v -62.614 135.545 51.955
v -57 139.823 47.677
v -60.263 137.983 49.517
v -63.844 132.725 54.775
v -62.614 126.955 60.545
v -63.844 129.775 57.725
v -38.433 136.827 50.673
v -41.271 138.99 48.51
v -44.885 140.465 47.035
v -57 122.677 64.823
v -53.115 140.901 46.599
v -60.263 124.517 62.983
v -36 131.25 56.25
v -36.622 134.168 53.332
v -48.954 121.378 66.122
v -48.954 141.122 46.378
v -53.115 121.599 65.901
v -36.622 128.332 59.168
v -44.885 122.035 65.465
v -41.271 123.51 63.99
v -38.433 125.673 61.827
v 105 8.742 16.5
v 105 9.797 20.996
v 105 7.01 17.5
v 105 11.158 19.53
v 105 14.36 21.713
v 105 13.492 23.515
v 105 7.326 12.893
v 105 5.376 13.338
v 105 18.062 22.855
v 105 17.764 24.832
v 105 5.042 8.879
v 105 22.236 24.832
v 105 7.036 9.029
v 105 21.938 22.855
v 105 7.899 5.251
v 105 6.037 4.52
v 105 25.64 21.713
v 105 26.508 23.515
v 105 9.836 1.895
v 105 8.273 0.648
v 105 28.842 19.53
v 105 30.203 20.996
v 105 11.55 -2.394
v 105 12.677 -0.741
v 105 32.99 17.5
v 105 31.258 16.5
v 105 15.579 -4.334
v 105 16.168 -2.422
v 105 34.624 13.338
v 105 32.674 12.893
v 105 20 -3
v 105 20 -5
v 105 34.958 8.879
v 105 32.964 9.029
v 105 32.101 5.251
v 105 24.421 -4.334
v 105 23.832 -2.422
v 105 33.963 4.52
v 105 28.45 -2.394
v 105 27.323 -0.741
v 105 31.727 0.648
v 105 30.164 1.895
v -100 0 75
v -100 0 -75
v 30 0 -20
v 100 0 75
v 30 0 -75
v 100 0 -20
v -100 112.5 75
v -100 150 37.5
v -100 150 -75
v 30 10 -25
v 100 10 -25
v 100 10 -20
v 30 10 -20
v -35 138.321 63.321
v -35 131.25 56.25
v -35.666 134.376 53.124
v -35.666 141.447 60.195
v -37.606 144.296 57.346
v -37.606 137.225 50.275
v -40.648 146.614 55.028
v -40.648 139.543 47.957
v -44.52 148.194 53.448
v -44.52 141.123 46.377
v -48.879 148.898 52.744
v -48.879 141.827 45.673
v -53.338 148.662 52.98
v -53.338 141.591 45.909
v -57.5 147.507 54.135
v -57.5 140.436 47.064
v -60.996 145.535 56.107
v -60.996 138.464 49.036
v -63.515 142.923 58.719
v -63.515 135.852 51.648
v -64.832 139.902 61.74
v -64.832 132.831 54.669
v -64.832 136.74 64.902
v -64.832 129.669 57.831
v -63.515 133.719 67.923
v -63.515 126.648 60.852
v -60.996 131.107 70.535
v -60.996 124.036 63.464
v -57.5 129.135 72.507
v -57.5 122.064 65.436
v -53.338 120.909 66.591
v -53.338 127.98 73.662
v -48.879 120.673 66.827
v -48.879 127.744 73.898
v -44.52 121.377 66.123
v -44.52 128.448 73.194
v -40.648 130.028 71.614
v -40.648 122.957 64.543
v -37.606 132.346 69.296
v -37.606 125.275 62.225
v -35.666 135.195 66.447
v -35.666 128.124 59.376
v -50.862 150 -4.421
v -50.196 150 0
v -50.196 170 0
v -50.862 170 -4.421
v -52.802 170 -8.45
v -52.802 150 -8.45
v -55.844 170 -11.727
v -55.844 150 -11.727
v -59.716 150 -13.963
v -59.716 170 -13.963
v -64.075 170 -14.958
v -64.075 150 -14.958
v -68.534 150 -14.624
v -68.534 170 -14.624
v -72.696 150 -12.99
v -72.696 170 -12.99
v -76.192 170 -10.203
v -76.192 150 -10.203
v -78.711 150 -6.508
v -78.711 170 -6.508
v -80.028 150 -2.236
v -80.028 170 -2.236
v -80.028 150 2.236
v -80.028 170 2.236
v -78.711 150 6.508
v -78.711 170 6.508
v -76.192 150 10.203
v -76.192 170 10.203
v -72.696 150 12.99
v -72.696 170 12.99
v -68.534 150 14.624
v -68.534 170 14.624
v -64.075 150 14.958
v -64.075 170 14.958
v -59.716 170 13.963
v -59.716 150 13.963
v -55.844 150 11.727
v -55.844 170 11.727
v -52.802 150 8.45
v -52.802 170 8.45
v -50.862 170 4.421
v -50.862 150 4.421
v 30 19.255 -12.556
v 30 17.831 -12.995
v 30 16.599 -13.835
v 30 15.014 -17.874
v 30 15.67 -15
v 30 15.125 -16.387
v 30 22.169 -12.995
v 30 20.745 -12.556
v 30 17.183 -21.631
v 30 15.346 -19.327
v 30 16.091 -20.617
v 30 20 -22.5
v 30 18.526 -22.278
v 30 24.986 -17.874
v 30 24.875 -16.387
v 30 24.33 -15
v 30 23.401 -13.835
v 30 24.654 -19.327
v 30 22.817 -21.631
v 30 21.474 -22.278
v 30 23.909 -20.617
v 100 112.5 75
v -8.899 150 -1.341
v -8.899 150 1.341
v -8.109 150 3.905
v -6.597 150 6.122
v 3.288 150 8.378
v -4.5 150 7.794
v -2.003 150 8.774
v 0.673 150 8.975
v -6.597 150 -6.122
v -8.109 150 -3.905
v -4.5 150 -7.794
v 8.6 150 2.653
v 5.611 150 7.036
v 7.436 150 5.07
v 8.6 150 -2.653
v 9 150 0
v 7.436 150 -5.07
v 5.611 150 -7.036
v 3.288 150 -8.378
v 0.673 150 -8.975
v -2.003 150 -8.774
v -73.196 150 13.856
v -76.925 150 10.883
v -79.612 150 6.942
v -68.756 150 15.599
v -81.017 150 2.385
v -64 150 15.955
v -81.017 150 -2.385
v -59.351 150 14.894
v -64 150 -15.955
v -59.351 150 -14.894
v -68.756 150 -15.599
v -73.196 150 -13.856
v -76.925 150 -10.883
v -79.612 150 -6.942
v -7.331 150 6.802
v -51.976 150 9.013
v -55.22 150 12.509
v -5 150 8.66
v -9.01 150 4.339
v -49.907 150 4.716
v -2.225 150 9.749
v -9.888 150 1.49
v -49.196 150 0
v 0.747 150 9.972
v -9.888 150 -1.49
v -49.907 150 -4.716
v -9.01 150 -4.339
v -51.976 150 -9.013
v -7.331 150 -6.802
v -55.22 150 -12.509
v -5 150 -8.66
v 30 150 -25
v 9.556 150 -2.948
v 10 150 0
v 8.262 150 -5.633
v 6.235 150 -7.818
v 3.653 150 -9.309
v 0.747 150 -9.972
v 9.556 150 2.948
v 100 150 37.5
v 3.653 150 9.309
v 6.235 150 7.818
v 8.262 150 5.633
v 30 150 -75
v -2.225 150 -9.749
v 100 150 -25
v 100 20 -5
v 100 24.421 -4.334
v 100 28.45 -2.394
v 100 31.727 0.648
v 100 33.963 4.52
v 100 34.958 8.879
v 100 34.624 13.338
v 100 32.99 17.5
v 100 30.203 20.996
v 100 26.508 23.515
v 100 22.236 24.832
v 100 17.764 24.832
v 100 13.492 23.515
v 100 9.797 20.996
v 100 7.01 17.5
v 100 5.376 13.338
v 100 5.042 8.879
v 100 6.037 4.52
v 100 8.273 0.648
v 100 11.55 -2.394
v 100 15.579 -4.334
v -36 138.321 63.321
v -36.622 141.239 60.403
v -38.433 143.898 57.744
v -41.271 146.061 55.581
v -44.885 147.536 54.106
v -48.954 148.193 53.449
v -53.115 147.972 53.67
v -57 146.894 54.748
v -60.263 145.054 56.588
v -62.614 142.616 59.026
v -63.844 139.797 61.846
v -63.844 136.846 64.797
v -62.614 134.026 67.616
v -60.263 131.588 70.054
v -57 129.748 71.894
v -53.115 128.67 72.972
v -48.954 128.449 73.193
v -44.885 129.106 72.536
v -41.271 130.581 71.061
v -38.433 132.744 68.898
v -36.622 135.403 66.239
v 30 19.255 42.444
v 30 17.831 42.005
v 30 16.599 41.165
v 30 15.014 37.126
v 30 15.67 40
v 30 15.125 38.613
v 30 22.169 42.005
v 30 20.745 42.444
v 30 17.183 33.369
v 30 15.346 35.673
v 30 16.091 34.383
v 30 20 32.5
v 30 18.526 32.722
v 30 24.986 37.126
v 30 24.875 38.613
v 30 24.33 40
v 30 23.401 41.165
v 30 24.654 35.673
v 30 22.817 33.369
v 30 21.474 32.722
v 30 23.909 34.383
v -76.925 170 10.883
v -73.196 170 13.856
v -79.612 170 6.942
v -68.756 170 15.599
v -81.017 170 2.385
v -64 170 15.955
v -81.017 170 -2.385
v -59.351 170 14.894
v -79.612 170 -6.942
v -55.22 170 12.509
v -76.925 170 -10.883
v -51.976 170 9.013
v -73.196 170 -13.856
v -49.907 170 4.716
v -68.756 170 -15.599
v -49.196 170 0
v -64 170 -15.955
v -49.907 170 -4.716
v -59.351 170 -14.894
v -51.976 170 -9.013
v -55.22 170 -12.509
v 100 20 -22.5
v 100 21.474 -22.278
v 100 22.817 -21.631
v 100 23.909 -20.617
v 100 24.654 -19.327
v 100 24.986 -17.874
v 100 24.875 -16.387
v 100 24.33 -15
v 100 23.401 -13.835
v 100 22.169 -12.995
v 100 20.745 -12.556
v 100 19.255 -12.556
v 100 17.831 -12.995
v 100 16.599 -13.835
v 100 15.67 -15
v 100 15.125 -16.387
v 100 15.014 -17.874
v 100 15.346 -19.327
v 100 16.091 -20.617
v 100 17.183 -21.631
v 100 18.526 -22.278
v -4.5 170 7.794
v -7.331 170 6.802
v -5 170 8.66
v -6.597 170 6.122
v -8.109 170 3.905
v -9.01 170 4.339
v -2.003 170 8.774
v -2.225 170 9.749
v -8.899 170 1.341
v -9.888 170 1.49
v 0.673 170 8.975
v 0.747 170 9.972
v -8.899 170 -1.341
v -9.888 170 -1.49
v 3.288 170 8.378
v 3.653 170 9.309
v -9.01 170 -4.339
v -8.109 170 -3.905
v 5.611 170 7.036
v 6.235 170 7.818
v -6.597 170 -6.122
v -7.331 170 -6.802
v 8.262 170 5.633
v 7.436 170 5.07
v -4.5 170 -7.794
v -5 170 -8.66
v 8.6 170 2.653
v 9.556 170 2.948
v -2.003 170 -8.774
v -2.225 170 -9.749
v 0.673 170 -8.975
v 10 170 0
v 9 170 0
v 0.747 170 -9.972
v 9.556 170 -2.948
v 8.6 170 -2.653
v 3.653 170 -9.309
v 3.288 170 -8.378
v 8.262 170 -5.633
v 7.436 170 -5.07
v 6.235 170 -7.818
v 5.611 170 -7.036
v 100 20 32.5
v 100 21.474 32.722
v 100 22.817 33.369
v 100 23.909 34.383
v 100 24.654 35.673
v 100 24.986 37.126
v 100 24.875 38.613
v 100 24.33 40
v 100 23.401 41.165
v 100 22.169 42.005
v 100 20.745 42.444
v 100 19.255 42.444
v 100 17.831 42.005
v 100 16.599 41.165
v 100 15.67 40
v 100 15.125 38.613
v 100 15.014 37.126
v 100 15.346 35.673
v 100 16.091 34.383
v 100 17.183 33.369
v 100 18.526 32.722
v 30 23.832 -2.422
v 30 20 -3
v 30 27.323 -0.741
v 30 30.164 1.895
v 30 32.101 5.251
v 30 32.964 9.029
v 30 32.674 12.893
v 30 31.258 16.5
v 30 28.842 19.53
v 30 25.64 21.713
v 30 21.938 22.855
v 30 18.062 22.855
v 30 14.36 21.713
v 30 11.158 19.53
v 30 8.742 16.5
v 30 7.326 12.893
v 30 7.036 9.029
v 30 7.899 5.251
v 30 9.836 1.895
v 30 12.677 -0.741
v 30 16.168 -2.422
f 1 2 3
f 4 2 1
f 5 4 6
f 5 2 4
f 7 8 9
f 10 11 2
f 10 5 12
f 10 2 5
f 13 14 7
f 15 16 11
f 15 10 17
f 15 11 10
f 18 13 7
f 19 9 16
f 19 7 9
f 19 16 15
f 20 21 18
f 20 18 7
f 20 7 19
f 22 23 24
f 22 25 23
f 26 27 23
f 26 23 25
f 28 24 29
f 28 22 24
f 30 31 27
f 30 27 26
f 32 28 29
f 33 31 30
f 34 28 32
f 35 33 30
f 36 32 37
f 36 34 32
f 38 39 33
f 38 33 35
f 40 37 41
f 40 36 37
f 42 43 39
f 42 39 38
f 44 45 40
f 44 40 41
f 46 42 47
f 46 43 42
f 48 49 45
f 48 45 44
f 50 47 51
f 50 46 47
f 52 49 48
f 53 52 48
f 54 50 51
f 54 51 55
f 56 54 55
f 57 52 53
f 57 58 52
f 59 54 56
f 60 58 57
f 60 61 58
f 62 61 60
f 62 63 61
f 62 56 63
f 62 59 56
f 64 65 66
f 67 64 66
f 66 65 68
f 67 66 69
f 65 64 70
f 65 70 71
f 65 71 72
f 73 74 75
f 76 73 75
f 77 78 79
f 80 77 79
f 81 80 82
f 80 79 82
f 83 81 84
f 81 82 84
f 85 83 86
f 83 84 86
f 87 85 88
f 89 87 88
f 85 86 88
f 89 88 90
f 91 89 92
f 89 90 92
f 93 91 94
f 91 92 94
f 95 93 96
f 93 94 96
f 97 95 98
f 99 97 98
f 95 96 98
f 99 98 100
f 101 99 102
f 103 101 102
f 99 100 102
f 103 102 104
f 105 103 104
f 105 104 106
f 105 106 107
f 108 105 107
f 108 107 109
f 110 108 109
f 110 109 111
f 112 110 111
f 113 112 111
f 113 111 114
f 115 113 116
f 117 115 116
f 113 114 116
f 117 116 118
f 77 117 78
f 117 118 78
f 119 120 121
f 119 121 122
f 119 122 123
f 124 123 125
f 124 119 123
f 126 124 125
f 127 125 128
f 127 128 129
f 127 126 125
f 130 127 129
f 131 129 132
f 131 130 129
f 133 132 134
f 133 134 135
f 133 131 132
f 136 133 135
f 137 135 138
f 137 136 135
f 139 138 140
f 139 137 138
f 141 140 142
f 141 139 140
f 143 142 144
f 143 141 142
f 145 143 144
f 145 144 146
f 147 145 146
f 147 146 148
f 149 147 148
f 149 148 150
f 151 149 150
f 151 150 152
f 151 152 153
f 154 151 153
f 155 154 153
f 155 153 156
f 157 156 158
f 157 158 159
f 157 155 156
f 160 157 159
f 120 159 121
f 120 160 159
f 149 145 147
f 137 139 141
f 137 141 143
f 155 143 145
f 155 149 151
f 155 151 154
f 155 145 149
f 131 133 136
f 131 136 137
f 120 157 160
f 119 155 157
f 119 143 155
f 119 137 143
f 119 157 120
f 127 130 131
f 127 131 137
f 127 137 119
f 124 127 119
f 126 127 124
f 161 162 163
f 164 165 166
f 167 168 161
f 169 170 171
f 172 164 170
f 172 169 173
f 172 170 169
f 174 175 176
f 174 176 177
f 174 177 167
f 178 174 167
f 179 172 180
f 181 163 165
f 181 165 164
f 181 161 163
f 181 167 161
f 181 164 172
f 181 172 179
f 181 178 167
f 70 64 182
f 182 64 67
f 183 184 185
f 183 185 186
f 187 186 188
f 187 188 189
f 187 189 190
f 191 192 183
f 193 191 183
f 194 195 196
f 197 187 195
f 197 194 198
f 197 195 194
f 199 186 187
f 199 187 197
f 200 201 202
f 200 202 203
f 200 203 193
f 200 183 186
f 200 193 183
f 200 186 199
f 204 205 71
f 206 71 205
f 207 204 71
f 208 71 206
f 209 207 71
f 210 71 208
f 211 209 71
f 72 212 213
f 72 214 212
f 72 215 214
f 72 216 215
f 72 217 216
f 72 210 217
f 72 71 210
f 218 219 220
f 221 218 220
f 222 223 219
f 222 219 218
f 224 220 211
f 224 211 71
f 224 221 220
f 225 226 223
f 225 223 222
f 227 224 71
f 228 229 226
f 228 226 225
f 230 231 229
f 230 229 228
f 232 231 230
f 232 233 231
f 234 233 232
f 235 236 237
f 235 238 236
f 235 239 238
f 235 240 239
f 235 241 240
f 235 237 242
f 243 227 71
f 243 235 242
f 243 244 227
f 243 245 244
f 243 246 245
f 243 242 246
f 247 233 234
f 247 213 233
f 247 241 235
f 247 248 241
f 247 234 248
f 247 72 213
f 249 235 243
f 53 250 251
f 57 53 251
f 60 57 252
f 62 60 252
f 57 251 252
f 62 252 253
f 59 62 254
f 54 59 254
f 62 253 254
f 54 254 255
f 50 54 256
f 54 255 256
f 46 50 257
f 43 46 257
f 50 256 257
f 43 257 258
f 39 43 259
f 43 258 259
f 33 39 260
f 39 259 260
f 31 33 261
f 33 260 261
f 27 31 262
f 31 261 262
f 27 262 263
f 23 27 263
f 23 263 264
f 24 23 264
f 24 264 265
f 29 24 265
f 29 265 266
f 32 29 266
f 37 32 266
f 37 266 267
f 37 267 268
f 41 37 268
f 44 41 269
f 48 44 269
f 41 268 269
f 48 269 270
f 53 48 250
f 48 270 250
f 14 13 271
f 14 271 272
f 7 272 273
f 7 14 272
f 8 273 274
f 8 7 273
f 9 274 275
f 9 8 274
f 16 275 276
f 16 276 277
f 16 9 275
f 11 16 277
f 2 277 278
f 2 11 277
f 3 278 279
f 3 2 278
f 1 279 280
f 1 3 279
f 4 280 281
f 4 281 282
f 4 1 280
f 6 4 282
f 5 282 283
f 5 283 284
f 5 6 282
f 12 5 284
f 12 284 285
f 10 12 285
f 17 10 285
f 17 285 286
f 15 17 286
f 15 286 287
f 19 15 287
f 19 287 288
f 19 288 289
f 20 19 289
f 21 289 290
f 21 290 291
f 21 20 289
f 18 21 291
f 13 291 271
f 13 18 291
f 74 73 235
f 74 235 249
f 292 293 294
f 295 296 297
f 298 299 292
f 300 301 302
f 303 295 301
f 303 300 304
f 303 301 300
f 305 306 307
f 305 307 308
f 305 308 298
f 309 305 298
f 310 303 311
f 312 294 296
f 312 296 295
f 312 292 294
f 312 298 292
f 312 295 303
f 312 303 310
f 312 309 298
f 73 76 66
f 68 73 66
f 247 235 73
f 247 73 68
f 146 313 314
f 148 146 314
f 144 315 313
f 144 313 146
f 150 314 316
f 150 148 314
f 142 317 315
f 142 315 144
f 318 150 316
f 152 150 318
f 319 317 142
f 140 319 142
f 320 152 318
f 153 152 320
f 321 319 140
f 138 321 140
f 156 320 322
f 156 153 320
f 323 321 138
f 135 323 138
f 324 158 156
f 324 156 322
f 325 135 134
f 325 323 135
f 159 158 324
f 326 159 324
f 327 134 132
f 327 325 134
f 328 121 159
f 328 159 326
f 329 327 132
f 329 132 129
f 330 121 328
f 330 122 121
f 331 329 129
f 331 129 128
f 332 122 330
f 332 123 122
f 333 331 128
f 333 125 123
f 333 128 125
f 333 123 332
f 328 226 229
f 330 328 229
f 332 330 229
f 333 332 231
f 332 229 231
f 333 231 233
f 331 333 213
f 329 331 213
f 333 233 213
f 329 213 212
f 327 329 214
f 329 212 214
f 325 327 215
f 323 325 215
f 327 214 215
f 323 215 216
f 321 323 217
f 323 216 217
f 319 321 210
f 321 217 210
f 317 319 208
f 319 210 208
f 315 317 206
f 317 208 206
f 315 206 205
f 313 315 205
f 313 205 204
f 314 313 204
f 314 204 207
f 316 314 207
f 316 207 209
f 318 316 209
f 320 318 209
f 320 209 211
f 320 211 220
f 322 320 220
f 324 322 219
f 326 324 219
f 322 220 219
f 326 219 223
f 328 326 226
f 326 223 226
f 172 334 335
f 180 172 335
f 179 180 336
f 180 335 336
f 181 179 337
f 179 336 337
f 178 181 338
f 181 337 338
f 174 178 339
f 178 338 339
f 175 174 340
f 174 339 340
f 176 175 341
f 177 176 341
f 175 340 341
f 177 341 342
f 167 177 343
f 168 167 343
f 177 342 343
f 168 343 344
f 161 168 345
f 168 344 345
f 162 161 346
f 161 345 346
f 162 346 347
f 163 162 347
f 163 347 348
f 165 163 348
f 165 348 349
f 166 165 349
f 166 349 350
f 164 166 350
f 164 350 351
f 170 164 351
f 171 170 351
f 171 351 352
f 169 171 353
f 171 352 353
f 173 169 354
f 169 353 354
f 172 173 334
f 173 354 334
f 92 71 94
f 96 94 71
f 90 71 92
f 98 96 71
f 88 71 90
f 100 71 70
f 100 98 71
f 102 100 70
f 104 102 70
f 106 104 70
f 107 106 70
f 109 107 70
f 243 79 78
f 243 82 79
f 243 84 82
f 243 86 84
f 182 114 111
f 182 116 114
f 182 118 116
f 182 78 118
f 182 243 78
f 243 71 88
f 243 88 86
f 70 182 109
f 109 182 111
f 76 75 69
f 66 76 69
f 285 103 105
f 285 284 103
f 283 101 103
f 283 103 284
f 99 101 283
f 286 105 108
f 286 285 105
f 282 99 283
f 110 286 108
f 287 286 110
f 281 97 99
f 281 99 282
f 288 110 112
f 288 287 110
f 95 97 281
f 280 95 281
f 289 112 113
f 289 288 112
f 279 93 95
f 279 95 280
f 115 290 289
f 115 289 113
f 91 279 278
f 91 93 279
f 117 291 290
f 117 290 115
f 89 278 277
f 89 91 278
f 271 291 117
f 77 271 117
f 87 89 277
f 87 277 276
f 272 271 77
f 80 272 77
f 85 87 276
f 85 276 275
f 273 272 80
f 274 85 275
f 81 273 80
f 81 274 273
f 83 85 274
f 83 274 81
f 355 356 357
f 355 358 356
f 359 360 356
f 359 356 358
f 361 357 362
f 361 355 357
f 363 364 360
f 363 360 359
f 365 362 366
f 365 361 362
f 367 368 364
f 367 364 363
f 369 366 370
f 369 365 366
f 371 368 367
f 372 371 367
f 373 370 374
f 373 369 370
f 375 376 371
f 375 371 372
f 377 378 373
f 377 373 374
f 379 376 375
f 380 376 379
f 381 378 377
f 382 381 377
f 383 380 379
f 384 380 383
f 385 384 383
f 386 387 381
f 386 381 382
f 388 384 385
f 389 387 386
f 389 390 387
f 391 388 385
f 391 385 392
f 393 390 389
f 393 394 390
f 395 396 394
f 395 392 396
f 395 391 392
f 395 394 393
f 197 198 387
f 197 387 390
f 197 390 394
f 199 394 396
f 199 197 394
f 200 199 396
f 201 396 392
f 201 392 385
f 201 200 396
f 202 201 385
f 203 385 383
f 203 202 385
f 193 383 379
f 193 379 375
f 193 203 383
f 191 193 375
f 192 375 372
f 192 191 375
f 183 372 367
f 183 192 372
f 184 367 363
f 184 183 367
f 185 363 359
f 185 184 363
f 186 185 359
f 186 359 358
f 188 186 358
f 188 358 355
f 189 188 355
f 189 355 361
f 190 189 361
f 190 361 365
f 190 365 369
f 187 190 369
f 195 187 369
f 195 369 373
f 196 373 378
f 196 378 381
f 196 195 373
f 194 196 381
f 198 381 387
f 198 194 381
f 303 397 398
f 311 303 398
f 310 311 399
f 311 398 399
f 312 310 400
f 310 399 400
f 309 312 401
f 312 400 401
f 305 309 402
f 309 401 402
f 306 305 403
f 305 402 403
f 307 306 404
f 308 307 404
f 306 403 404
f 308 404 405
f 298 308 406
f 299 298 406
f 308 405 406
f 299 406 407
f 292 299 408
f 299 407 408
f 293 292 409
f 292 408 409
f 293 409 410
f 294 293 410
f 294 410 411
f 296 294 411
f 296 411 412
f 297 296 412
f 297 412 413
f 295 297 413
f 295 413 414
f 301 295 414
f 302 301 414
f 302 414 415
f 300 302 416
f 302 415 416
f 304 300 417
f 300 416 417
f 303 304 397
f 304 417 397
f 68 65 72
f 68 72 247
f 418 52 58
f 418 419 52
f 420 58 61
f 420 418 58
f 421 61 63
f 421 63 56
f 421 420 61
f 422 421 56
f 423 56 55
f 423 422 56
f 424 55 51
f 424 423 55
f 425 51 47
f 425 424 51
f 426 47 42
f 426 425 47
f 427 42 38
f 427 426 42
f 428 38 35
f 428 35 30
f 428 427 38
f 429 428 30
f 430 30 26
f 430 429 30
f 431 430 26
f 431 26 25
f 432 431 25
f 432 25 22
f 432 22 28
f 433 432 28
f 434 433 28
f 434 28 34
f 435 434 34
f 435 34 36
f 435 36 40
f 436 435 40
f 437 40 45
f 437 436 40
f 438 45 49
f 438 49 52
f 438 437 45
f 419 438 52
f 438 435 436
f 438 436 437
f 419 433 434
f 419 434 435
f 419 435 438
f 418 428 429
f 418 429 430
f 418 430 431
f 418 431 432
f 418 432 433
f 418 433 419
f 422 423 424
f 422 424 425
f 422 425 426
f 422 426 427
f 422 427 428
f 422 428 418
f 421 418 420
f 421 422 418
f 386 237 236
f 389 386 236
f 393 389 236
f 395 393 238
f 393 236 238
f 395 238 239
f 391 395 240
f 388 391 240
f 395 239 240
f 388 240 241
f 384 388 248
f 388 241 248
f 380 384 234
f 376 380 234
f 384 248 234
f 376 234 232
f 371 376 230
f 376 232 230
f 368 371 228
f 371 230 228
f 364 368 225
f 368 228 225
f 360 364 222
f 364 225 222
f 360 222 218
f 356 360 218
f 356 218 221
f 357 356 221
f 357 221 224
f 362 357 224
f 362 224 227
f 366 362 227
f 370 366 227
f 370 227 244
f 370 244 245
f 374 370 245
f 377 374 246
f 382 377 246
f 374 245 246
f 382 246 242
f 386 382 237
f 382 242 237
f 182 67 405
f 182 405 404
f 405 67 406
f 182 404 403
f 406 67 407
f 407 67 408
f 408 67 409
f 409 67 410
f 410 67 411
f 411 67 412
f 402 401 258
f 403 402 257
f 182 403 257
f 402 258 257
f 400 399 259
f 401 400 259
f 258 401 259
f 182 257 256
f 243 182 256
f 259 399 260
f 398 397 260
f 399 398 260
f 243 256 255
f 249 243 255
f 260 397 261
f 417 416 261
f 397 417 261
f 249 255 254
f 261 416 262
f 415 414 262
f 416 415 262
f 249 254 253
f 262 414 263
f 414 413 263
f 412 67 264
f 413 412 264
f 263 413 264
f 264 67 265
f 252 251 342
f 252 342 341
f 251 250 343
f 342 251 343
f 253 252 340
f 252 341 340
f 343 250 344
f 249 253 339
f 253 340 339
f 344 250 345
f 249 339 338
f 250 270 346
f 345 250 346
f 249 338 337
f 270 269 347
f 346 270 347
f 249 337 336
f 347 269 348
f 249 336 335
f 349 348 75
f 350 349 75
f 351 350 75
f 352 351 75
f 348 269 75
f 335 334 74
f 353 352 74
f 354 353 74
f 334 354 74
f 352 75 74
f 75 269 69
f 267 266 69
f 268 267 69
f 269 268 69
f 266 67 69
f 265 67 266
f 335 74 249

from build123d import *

# Parameters (mm, degrees)
SKETCH1_W           = 200
SKETCH1_H           = 150
BOSS_EXTRUDE1_DEPTH = 150
SKETCH2_R           = 15
SKETCH2_R_2         = 13
BOSS_EXTRUDE2_DEPTH = 5
SKETCH3_R           = 13
SKETCH3_R_2         = 5
CUT_EXTRUDE1_DEPTH  = 70
CUT_EXTRUDE2_DEPTH  = 201
SKETCH5_R           = 15
SKETCH5_R_2         = 14
BOSS_EXTRUDE3_DEPTH = 10
SKETCH7_R           = 10
SKETCH7_R_2         = 9
SKETCH7_R_3         = 16
SKETCH7_R_4         = 15
BOSS_EXTRUDE4_DEPTH = 20
SKETCH10_W          = 70
SKETCH10_H          = 50
CUT_EXTRUDE5_DEPTH  = 151


with BuildPart() as part:
    # Sketch1 → Boss-Extrude1 (new body)
    with BuildSketch(Plane(origin=(0, 0, 0), x_dir=(1, 0, 0), z_dir=(0, 1, 0))):
        Rectangle(SKETCH1_W, SKETCH1_H)
    extrude(amount=BOSS_EXTRUDE1_DEPTH)

    # Sketch2 → Boss-Extrude2 (add)
    with BuildSketch(Plane(origin=(100, 0, 0), x_dir=(0, 0, -1), z_dir=(1, 0, 0))):
        with Locations((-10, 20)):
            Circle(SKETCH2_R)
        with Locations((-10, 20)):
            Circle(SKETCH2_R_2, mode=Mode.SUBTRACT)
    extrude(amount=BOSS_EXTRUDE2_DEPTH)

    # Sketch3 → Cut-Extrude1 (cut)
    with BuildSketch(Plane(origin=(100, 0, 0), x_dir=(0, 0, -1), z_dir=(1, 0, 0))):
        with Locations((-10, 20)):
            Circle(SKETCH3_R)
        with Locations((-37.5, 20)):
            Circle(SKETCH3_R_2)
        with Locations((17.5, 20)):
            Circle(SKETCH3_R_2)
        Polygon((75, 10), (20, 10), (20, 0), (20, -30), (75, -30), (75, 0), align=None)
    extrude(amount=-CUT_EXTRUDE1_DEPTH, mode=Mode.SUBTRACT)

    # Sketch4 → Cut-Extrude2 (cut, through all)
    with BuildSketch(Plane(origin=(100, 0, 0), x_dir=(0, 0, -1), z_dir=(1, 0, 0))):
        Polygon((-37.5, 150), (-75, 112.5), (-75, 150), align=None)
    extrude(amount=-CUT_EXTRUDE2_DEPTH, mode=Mode.SUBTRACT)

    # Sketch5 → Boss-Extrude3 (add)
    with BuildSketch(Plane(origin=(0, 93.75, 93.75), x_dir=(1, 0, 0), z_dir=(0, 0.707106781, 0.707106781))):
        with Locations((-50, 53.033008589)):
            Circle(SKETCH5_R)
        with Locations((-50, 53.033008589)):
            Circle(SKETCH5_R_2, mode=Mode.SUBTRACT)
    extrude(amount=BOSS_EXTRUDE3_DEPTH)

    # Sketch7 → Boss-Extrude4 (add)
    with BuildSketch(Plane(origin=(0, 150, 0), x_dir=(1, 0, 0), z_dir=(0, 1, 0))):
        Circle(SKETCH7_R)
        Circle(SKETCH7_R_2, mode=Mode.SUBTRACT)
        with Locations((-65.196037567, 0)):
            Circle(SKETCH7_R_3)
        with Locations((-65.196037567, 0)):
            Circle(SKETCH7_R_4, mode=Mode.SUBTRACT)
    extrude(amount=BOSS_EXTRUDE4_DEPTH)

    # Sketch10 → Cut-Extrude5 (cut, through all)
    with BuildSketch(Plane(origin=(0, 150, 0), x_dir=(1, 0, 0), z_dir=(0, 1, 0))):
        with Locations((65, 50)):
            Rectangle(SKETCH10_W, SKETCH10_H)
    extrude(amount=-CUT_EXTRUDE5_DEPTH, mode=Mode.SUBTRACT)


solid = part.part
